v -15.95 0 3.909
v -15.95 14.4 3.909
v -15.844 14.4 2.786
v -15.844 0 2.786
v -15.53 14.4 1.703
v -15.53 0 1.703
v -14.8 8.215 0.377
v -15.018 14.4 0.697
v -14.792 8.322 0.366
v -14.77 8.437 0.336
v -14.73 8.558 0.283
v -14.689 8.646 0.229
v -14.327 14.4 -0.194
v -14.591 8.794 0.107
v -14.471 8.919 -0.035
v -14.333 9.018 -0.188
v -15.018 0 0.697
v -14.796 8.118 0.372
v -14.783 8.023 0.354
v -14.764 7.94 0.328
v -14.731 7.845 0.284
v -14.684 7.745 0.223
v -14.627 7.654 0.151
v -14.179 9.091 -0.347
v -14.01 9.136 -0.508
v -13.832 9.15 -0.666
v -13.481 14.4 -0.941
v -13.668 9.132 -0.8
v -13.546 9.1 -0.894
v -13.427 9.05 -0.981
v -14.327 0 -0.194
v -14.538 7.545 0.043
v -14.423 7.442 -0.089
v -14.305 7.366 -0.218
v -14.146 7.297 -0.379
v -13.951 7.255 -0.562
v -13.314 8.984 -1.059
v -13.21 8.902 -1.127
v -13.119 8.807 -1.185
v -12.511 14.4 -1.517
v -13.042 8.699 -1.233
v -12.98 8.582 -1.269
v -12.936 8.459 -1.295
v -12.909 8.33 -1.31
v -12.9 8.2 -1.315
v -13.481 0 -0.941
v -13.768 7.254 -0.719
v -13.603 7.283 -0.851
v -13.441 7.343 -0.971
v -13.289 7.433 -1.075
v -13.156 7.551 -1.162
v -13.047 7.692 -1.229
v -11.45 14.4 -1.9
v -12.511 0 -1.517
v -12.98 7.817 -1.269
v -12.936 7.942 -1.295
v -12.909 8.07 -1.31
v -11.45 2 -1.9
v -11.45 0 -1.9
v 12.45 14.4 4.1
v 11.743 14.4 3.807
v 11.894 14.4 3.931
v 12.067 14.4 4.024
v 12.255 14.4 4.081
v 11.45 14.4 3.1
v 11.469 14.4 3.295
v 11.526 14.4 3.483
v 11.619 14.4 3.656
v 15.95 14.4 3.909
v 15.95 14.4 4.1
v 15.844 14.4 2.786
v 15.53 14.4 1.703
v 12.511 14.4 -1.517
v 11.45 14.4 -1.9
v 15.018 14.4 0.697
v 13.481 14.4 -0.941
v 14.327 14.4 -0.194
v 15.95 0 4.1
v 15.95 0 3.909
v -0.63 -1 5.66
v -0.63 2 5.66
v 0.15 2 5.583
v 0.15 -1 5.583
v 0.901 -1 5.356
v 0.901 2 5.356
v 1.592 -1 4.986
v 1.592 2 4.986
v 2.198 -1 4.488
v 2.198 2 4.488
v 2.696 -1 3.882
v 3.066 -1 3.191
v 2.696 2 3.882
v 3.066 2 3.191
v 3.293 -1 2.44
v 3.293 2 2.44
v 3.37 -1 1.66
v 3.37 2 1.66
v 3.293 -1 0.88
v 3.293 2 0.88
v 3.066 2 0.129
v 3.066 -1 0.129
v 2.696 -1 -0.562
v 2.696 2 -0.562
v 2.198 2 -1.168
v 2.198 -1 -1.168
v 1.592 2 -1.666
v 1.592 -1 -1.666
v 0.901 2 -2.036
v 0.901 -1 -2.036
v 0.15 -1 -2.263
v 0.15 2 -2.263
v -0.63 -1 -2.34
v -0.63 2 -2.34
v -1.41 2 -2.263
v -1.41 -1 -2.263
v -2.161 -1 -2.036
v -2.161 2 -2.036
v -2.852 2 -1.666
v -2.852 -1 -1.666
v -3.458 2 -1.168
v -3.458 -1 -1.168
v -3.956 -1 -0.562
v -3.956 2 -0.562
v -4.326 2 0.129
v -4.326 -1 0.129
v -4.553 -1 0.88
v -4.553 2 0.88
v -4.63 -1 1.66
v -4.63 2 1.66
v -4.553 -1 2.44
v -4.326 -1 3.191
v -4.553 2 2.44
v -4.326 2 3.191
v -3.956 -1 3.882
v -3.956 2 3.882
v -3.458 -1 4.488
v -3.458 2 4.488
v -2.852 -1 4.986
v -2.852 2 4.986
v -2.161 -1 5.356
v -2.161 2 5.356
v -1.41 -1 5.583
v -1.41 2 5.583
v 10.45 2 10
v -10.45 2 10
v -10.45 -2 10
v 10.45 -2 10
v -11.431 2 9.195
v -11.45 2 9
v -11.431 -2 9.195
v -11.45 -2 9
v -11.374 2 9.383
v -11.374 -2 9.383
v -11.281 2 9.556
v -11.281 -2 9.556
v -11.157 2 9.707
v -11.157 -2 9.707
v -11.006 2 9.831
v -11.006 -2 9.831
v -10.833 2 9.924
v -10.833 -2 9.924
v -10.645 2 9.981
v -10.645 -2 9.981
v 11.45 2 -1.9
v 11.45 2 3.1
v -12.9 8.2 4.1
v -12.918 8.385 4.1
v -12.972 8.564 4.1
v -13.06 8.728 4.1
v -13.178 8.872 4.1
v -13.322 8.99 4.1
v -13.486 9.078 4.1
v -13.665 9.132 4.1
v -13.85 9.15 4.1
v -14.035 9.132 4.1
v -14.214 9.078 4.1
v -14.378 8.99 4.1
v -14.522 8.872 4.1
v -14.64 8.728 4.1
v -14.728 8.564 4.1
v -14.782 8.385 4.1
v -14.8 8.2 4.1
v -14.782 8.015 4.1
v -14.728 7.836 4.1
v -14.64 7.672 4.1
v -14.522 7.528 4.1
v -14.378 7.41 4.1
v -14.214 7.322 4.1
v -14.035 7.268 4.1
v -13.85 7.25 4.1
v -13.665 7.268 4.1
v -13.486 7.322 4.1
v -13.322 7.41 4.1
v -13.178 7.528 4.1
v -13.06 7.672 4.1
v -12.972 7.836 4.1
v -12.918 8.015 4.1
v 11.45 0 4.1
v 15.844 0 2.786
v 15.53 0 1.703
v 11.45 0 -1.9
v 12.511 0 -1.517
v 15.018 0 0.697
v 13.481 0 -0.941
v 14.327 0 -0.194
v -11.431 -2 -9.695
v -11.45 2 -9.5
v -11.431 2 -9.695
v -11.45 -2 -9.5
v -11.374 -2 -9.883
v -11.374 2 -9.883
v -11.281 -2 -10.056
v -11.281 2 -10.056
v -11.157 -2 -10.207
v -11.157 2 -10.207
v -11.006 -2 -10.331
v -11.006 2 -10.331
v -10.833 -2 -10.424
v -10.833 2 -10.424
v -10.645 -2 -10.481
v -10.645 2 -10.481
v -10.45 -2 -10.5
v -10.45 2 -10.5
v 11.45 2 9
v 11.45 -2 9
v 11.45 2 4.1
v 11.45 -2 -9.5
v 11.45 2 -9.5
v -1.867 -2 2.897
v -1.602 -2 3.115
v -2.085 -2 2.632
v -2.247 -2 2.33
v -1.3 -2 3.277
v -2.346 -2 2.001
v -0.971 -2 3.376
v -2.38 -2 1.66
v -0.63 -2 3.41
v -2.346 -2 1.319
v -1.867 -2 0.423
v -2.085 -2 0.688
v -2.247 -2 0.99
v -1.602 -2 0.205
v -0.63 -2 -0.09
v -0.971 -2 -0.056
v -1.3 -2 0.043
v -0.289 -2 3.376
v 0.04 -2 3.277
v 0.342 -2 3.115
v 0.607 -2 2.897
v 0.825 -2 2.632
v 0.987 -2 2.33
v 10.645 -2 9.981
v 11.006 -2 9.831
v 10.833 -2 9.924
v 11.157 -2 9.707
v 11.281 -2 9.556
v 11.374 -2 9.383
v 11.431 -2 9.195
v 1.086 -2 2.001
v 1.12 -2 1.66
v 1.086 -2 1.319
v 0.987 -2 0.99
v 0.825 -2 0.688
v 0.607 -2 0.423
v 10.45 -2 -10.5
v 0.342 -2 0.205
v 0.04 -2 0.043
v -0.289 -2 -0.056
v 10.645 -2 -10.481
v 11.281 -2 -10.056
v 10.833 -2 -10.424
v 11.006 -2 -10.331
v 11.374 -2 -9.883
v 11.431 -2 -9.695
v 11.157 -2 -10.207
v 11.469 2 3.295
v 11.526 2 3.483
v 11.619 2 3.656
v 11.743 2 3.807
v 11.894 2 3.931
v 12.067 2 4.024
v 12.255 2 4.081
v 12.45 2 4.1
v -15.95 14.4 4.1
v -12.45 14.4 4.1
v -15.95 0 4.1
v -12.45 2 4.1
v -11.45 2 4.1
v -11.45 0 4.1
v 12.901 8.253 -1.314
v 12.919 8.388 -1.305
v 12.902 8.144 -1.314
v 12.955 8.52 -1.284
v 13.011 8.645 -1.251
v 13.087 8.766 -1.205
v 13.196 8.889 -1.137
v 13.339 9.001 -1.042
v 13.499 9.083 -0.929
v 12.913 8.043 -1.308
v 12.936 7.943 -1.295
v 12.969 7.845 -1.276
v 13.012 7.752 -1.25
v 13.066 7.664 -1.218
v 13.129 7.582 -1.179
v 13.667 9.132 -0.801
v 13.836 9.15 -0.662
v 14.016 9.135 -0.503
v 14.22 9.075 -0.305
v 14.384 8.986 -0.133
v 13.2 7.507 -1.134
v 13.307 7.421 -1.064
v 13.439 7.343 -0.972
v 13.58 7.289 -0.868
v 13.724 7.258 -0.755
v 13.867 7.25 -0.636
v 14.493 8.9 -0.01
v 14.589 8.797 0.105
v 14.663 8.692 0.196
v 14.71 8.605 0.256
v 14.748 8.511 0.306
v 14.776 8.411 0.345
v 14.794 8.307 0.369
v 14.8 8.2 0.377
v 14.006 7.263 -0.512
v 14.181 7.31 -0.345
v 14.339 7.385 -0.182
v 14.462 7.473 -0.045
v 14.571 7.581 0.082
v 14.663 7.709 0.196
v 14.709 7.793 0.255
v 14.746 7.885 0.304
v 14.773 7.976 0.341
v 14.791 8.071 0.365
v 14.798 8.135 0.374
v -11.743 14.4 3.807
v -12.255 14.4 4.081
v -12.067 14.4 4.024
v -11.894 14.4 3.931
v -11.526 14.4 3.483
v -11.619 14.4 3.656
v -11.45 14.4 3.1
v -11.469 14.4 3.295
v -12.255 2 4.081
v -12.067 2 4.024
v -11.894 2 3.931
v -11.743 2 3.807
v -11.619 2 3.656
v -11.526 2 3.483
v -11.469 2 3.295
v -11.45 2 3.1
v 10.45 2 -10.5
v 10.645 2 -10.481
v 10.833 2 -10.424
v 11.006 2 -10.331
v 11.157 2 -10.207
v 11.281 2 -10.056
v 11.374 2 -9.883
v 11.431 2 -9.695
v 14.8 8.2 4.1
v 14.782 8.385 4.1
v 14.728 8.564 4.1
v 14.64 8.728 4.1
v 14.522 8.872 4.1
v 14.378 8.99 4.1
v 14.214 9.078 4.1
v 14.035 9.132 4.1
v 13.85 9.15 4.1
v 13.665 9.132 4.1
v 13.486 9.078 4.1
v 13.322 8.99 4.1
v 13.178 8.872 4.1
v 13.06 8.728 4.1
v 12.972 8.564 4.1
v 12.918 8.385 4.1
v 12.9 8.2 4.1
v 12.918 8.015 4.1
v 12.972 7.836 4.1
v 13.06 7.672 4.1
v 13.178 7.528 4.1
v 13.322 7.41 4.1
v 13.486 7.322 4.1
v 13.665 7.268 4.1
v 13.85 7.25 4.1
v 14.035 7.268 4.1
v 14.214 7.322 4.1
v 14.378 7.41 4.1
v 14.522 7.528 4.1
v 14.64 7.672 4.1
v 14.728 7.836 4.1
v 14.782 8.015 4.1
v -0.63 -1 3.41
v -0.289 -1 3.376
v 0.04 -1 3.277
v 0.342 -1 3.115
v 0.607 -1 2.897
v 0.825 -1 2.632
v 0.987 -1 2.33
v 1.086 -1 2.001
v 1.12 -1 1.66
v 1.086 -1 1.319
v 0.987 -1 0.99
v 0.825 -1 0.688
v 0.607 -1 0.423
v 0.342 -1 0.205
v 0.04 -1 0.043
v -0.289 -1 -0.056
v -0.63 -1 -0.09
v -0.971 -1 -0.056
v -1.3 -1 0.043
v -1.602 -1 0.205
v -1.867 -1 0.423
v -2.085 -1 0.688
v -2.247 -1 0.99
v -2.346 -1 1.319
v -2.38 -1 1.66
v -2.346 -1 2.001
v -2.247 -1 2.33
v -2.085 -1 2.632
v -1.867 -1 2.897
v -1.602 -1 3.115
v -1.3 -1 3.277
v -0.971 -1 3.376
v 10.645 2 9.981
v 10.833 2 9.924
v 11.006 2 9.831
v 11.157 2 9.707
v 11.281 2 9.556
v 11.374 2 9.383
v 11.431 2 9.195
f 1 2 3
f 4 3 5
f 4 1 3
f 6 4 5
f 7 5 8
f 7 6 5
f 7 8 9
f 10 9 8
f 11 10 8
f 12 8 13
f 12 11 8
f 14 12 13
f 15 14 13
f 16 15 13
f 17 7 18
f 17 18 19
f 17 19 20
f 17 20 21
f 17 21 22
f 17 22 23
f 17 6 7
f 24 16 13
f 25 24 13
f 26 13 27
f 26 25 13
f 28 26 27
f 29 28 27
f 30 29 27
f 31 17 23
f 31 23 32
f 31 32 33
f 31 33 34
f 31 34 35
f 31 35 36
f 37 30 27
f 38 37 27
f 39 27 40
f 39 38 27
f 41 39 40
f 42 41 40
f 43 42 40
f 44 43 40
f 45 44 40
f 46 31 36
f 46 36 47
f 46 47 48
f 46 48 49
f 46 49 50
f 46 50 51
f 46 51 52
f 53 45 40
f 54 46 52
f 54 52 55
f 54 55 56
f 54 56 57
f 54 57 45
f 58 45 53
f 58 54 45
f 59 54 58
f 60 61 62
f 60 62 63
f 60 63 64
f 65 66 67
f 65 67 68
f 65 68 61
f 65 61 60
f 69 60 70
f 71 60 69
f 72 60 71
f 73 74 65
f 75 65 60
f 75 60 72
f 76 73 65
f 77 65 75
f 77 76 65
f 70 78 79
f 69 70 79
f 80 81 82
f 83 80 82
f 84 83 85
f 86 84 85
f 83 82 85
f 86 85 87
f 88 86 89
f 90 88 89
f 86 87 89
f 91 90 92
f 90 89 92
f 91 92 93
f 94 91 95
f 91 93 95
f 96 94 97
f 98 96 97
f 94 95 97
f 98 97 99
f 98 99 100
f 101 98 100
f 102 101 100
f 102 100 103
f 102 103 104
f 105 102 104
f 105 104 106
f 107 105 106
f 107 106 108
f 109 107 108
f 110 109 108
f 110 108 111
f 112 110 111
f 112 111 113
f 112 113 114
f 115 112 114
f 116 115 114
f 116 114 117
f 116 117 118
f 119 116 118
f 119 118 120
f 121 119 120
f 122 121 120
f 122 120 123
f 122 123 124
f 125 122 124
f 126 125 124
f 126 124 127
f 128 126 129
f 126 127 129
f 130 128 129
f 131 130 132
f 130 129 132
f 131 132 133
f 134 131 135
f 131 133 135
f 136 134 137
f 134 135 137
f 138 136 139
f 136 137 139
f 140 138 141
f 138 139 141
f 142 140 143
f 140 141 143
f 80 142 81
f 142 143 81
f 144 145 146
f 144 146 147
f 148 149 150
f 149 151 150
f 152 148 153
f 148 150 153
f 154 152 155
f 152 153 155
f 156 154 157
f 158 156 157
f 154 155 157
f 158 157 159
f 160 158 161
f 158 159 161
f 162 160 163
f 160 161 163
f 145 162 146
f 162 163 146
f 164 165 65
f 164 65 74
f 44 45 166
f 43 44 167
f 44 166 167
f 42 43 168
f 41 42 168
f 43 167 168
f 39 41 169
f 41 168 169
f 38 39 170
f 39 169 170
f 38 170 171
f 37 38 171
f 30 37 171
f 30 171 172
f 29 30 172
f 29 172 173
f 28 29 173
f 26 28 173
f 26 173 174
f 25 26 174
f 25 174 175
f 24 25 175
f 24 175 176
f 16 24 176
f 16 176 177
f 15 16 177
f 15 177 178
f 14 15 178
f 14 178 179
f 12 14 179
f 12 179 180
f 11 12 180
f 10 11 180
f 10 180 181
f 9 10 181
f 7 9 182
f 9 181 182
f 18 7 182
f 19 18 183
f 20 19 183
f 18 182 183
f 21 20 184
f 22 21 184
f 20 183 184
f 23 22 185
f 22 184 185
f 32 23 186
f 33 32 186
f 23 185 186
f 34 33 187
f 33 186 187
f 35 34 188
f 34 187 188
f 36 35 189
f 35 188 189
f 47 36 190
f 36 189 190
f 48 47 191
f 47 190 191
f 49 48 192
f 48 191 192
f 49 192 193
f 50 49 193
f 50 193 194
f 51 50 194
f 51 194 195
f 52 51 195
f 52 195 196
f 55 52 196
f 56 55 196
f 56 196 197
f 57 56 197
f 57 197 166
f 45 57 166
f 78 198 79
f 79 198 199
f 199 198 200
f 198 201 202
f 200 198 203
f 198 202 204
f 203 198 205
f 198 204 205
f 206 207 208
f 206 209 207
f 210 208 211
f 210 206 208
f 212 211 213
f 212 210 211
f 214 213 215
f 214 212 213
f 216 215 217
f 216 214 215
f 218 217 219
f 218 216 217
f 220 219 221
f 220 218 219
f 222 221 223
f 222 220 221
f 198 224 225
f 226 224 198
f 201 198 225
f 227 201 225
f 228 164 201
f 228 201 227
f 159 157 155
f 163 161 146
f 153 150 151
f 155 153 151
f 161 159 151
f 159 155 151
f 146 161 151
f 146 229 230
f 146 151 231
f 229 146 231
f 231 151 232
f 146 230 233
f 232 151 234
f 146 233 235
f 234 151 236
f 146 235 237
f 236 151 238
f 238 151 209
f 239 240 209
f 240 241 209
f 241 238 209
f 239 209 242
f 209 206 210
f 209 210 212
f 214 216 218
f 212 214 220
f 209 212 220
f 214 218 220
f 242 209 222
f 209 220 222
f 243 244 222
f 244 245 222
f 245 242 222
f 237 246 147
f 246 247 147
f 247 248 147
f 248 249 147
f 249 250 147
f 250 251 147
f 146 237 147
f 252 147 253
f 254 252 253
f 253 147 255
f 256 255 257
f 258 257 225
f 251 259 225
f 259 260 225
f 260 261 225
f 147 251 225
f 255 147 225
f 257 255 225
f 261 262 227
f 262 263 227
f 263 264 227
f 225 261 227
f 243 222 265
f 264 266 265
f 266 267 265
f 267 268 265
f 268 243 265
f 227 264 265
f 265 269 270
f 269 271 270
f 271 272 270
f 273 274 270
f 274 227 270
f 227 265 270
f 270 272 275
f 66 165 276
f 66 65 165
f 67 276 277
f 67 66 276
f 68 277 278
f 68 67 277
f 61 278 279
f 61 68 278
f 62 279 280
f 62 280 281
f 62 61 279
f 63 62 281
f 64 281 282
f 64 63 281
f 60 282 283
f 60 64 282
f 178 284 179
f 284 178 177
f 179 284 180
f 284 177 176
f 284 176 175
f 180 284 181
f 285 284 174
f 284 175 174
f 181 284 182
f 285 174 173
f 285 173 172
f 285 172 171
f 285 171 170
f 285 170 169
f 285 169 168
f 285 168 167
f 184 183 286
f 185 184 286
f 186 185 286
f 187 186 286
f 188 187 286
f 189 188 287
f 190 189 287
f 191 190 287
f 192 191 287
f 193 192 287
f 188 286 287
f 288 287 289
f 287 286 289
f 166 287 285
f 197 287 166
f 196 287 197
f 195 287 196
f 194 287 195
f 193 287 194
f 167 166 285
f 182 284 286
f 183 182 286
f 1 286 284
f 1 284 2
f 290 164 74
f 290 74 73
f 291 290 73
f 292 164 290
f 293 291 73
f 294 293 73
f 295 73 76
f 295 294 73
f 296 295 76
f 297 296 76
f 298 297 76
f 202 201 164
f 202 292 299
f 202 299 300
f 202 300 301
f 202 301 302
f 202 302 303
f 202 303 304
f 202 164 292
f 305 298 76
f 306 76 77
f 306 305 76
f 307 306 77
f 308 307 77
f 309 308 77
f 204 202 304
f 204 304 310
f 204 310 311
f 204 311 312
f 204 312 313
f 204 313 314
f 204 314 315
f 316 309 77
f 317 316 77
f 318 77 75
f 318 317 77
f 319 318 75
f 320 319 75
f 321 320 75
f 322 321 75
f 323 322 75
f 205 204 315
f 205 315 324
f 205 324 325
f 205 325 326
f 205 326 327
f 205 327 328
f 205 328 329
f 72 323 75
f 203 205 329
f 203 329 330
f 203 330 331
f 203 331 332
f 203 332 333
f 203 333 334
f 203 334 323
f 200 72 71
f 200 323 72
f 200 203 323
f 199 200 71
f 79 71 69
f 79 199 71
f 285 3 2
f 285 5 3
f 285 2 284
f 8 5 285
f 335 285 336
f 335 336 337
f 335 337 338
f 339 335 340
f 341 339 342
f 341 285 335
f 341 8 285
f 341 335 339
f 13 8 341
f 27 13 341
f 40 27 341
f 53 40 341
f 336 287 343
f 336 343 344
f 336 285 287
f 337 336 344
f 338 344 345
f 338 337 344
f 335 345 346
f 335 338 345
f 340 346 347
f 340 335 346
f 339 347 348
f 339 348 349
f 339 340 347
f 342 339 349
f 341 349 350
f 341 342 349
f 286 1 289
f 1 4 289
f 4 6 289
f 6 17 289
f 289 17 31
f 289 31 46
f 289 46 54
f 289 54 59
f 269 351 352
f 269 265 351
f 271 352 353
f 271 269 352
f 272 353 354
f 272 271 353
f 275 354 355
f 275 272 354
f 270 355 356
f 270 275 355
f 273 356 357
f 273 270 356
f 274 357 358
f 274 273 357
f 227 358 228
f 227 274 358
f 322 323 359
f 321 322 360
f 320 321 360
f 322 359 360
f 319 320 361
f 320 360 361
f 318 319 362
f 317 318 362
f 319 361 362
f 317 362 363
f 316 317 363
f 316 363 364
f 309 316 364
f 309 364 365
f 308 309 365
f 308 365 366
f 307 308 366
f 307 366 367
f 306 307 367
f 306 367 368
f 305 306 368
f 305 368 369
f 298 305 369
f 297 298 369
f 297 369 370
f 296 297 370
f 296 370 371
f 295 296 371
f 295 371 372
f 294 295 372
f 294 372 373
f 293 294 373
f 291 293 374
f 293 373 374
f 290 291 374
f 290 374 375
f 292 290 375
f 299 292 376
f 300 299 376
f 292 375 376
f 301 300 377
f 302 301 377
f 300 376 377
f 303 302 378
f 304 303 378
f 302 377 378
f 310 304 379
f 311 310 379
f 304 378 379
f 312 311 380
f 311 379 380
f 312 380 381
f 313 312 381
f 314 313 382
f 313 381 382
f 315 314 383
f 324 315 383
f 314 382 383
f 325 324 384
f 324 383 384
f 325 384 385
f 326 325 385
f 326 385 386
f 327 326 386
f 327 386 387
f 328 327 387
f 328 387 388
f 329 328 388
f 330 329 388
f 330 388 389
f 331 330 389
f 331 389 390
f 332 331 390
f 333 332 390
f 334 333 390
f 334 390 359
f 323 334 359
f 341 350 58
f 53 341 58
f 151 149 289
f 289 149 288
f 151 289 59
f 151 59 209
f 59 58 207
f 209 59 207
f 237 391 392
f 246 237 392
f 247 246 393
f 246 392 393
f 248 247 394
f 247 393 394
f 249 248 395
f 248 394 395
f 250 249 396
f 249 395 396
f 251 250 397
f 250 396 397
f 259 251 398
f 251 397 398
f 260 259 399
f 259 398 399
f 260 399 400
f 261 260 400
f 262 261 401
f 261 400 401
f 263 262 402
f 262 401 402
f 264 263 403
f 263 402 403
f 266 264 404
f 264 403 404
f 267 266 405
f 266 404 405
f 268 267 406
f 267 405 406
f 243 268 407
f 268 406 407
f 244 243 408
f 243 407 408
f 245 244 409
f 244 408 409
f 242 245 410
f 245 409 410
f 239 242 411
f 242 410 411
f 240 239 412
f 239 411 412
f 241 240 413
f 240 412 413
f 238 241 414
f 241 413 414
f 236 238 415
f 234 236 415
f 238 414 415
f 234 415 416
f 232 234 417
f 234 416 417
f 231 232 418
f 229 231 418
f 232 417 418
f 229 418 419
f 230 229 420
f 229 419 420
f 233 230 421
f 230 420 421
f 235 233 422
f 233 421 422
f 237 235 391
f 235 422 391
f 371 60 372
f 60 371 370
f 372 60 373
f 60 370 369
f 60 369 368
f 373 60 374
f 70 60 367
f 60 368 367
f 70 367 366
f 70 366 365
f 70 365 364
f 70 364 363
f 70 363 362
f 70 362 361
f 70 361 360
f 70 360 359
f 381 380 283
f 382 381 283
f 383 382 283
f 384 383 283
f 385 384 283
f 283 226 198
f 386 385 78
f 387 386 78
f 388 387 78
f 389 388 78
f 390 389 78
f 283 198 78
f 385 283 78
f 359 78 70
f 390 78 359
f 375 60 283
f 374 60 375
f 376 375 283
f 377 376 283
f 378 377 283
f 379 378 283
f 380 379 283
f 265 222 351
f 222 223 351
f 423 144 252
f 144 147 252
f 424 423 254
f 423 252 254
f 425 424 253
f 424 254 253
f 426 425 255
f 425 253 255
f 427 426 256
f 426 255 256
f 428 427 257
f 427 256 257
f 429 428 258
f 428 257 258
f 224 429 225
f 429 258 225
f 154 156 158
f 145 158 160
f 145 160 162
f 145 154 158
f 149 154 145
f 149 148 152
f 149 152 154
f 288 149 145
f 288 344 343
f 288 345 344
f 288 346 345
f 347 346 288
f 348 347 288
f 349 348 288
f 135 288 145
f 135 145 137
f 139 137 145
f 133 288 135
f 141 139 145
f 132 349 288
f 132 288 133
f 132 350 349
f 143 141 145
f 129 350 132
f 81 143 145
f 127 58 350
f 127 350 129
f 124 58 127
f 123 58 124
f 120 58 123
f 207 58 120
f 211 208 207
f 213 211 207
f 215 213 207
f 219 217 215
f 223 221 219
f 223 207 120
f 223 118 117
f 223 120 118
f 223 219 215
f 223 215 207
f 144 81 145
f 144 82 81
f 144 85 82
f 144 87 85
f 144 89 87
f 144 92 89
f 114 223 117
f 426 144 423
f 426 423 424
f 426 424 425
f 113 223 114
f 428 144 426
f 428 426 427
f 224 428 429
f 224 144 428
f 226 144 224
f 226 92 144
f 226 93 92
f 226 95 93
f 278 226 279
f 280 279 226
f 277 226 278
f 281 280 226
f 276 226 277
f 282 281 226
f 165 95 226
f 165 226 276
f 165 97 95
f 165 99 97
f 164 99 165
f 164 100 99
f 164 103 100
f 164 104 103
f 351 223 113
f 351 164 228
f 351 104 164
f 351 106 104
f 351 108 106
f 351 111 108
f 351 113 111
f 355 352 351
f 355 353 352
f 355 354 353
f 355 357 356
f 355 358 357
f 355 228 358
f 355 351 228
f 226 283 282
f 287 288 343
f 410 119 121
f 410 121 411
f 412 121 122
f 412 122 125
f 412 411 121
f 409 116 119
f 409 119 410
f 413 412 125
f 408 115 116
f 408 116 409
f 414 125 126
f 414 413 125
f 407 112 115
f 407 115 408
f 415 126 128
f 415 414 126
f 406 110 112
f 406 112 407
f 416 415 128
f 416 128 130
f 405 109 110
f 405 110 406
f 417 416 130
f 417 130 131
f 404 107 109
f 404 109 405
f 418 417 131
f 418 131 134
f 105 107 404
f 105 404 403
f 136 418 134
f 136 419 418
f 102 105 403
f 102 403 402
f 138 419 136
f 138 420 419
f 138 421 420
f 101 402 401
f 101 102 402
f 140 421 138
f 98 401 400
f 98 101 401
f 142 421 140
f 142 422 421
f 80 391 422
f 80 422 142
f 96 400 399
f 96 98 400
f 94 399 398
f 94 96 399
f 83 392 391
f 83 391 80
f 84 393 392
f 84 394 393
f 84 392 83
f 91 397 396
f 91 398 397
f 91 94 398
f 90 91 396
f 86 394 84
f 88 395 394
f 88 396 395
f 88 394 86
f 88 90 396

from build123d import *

# Parameters (mm, degrees)
SKETCH_1_W          = 22.9
SKETCH_1_H          = 21
EXTRUDE_1_DEPTH     = 2
SKETCH_2_W          = 4.5
SKETCH_2_H          = 6
EXTRUDE_2_DEPTH     = 14.4
FILLET_1_R          = 1
SKETCH_3_R          = 4
CUT_EXTRUDE_1_DEPTH = 14.4
SKETCH_5_R          = 0.95
CUT_EXTRUDE_2_DEPTH = 14.4
SKETCH_1_2_W        = 22.9
SKETCH_1_2_H        = 21
EXTRUDE_3_DEPTH     = 2
SKETCH_6_R          = 4
CUT_EXTRUDE_3_DEPTH = 1
SKETCH_7_R          = 1.75
CUT_EXTRUDE_4_DEPTH = 1
FILLET_2_R          = 1
SKETCH_9_W          = 22.900603658
SKETCH_9_H          = 0.5
CUT_EXTRUDE_5_DEPTH = 4
FILLET_4_R          = 1
FILLET_5_DEPTH      = 14.4


with BuildPart() as part:
    # 草图1 → 凸台-拉伸1 (new body)
    with BuildSketch(Plane(origin=(0, 0, 0), x_dir=(1, 0, 0), z_dir=(0, 1, 0))):
        Rectangle(SKETCH_1_W, SKETCH_1_H)
    extrude(amount=EXTRUDE_1_DEPTH)

    # 草图2 → 凸台-拉伸2 (add)
    with BuildSketch(Plane(origin=(0, 0, 0), x_dir=(1, 0, 0), z_dir=(0, 1, 0))):
        with Locations((-13.7, -1.1)):
            Rectangle(SKETCH_2_W, SKETCH_2_H)
        with Locations((13.7, -1.1)):
            Rectangle(SKETCH_2_W, SKETCH_2_H)
    extrude(amount=EXTRUDE_2_DEPTH)

    # 圆角1
    fillet_1_edges = [part.edges().sort_by_distance(p)[0] for p in [
        (-11.45, 8.2, 4.1),
        (11.45, 8.2, 4.1),
    ]]
    fillet(fillet_1_edges, radius=FILLET_1_R)

    # 草图3 → 切除-拉伸1 (cut)
    with BuildSketch(Plane(origin=(0, 2, 0), x_dir=(1, 0, 0), z_dir=(0, 1, 0))):
        with Locations(Location((-0.63, -1.66, 0), (0, 0, 270))):
            Circle(SKETCH_3_R)
    extrude(amount=-CUT_EXTRUDE_1_DEPTH, mode=Mode.SUBTRACT)

    # 草图5 → 切除-拉伸2 (cut)
    with BuildSketch(Plane.XY.offset(4.1)):
        with Locations((-13.85, 8.2)):
            Circle(SKETCH_5_R)
        with Locations((13.85, 8.2)):
            Circle(SKETCH_5_R)
    extrude(amount=-CUT_EXTRUDE_2_DEPTH, mode=Mode.SUBTRACT)

    # 草图1<2> → 凸台-拉伸3 (add)
    with BuildSketch(Plane(origin=(0, 0, 0), x_dir=(1, 0, 0), z_dir=(0, 1, 0))):
        Rectangle(SKETCH_1_2_W, SKETCH_1_2_H)
    extrude(amount=-EXTRUDE_3_DEPTH)

    # 草图6 → 切除-拉伸3 (cut)
    with BuildSketch(Plane(origin=(0, 0, 0), x_dir=(1, 0, 0), z_dir=(0, 1, 0))):
        with Locations(Location((-0.63, -1.66, 0), (0, 0, 270))):
            Circle(SKETCH_6_R)
    extrude(amount=-CUT_EXTRUDE_3_DEPTH, mode=Mode.SUBTRACT)

    # 草图7 → 切除-拉伸4 (cut)
    with BuildSketch(Plane(origin=(0, -1, 0), x_dir=(1, 0, 0), z_dir=(0, 1, 0))):
        with Locations(Location((-0.63, -1.66, 0), (0, 0, 270))):
            Circle(SKETCH_7_R)
    extrude(amount=-CUT_EXTRUDE_4_DEPTH, mode=Mode.SUBTRACT)

    # 圆角2
    fillet_2_edges = [part.edges().sort_by_distance(p)[0] for p in [
        (11.45, 0, -10.5),
        (-11.45, 0, -10.5),
    ]]
    fillet(fillet_2_edges, radius=FILLET_2_R)

    # 草图9 → 切除-拉伸5 (cut)
    with BuildSketch(Plane(origin=(0, 2, 0), x_dir=(1, 0, 0), z_dir=(0, 1, 0))):
        with Locations((-0.000301829, -10.25)):
            Rectangle(SKETCH_9_W, SKETCH_9_H)
    extrude(amount=-CUT_EXTRUDE_5_DEPTH, mode=Mode.SUBTRACT)

    # 圆角4
    fillet_4_edges = [part.edges().sort_by_distance(p)[0] for p in [
        (-11.45, 0, 10),
        (11.45, 0, 10),
    ]]
    fillet(fillet_4_edges, radius=FILLET_4_R)

    # 圆角5: read off the stored shape, not the designer's step
    # 圆角5 outline → 圆角5 (cut)
    with BuildSketch(Plane(origin=(0, 0, 0), x_dir=(1, 0, 0), z_dir=(0, 1, 0))):
        with BuildLine():
            ThreePointArc((11.45, 1.9), (14.69341649, -0.235240405), (15.95, -3.909475019))
            Line((15.95, -3.909475019), (15.95, 1.9))
            Line((15.95, 1.9), (11.45, 1.9))
        make_face()
        with BuildLine():
            ThreePointArc((-15.95, -3.909475019), (-14.69341649, -0.235240405), (-11.45, 1.9))
            Line((-11.45, 1.9), (-15.95, 1.9))
            Line((-15.95, 1.9), (-15.95, -3.909475019))
        make_face()
    extrude(amount=FILLET_5_DEPTH, mode=Mode.SUBTRACT)


solid = part.part
